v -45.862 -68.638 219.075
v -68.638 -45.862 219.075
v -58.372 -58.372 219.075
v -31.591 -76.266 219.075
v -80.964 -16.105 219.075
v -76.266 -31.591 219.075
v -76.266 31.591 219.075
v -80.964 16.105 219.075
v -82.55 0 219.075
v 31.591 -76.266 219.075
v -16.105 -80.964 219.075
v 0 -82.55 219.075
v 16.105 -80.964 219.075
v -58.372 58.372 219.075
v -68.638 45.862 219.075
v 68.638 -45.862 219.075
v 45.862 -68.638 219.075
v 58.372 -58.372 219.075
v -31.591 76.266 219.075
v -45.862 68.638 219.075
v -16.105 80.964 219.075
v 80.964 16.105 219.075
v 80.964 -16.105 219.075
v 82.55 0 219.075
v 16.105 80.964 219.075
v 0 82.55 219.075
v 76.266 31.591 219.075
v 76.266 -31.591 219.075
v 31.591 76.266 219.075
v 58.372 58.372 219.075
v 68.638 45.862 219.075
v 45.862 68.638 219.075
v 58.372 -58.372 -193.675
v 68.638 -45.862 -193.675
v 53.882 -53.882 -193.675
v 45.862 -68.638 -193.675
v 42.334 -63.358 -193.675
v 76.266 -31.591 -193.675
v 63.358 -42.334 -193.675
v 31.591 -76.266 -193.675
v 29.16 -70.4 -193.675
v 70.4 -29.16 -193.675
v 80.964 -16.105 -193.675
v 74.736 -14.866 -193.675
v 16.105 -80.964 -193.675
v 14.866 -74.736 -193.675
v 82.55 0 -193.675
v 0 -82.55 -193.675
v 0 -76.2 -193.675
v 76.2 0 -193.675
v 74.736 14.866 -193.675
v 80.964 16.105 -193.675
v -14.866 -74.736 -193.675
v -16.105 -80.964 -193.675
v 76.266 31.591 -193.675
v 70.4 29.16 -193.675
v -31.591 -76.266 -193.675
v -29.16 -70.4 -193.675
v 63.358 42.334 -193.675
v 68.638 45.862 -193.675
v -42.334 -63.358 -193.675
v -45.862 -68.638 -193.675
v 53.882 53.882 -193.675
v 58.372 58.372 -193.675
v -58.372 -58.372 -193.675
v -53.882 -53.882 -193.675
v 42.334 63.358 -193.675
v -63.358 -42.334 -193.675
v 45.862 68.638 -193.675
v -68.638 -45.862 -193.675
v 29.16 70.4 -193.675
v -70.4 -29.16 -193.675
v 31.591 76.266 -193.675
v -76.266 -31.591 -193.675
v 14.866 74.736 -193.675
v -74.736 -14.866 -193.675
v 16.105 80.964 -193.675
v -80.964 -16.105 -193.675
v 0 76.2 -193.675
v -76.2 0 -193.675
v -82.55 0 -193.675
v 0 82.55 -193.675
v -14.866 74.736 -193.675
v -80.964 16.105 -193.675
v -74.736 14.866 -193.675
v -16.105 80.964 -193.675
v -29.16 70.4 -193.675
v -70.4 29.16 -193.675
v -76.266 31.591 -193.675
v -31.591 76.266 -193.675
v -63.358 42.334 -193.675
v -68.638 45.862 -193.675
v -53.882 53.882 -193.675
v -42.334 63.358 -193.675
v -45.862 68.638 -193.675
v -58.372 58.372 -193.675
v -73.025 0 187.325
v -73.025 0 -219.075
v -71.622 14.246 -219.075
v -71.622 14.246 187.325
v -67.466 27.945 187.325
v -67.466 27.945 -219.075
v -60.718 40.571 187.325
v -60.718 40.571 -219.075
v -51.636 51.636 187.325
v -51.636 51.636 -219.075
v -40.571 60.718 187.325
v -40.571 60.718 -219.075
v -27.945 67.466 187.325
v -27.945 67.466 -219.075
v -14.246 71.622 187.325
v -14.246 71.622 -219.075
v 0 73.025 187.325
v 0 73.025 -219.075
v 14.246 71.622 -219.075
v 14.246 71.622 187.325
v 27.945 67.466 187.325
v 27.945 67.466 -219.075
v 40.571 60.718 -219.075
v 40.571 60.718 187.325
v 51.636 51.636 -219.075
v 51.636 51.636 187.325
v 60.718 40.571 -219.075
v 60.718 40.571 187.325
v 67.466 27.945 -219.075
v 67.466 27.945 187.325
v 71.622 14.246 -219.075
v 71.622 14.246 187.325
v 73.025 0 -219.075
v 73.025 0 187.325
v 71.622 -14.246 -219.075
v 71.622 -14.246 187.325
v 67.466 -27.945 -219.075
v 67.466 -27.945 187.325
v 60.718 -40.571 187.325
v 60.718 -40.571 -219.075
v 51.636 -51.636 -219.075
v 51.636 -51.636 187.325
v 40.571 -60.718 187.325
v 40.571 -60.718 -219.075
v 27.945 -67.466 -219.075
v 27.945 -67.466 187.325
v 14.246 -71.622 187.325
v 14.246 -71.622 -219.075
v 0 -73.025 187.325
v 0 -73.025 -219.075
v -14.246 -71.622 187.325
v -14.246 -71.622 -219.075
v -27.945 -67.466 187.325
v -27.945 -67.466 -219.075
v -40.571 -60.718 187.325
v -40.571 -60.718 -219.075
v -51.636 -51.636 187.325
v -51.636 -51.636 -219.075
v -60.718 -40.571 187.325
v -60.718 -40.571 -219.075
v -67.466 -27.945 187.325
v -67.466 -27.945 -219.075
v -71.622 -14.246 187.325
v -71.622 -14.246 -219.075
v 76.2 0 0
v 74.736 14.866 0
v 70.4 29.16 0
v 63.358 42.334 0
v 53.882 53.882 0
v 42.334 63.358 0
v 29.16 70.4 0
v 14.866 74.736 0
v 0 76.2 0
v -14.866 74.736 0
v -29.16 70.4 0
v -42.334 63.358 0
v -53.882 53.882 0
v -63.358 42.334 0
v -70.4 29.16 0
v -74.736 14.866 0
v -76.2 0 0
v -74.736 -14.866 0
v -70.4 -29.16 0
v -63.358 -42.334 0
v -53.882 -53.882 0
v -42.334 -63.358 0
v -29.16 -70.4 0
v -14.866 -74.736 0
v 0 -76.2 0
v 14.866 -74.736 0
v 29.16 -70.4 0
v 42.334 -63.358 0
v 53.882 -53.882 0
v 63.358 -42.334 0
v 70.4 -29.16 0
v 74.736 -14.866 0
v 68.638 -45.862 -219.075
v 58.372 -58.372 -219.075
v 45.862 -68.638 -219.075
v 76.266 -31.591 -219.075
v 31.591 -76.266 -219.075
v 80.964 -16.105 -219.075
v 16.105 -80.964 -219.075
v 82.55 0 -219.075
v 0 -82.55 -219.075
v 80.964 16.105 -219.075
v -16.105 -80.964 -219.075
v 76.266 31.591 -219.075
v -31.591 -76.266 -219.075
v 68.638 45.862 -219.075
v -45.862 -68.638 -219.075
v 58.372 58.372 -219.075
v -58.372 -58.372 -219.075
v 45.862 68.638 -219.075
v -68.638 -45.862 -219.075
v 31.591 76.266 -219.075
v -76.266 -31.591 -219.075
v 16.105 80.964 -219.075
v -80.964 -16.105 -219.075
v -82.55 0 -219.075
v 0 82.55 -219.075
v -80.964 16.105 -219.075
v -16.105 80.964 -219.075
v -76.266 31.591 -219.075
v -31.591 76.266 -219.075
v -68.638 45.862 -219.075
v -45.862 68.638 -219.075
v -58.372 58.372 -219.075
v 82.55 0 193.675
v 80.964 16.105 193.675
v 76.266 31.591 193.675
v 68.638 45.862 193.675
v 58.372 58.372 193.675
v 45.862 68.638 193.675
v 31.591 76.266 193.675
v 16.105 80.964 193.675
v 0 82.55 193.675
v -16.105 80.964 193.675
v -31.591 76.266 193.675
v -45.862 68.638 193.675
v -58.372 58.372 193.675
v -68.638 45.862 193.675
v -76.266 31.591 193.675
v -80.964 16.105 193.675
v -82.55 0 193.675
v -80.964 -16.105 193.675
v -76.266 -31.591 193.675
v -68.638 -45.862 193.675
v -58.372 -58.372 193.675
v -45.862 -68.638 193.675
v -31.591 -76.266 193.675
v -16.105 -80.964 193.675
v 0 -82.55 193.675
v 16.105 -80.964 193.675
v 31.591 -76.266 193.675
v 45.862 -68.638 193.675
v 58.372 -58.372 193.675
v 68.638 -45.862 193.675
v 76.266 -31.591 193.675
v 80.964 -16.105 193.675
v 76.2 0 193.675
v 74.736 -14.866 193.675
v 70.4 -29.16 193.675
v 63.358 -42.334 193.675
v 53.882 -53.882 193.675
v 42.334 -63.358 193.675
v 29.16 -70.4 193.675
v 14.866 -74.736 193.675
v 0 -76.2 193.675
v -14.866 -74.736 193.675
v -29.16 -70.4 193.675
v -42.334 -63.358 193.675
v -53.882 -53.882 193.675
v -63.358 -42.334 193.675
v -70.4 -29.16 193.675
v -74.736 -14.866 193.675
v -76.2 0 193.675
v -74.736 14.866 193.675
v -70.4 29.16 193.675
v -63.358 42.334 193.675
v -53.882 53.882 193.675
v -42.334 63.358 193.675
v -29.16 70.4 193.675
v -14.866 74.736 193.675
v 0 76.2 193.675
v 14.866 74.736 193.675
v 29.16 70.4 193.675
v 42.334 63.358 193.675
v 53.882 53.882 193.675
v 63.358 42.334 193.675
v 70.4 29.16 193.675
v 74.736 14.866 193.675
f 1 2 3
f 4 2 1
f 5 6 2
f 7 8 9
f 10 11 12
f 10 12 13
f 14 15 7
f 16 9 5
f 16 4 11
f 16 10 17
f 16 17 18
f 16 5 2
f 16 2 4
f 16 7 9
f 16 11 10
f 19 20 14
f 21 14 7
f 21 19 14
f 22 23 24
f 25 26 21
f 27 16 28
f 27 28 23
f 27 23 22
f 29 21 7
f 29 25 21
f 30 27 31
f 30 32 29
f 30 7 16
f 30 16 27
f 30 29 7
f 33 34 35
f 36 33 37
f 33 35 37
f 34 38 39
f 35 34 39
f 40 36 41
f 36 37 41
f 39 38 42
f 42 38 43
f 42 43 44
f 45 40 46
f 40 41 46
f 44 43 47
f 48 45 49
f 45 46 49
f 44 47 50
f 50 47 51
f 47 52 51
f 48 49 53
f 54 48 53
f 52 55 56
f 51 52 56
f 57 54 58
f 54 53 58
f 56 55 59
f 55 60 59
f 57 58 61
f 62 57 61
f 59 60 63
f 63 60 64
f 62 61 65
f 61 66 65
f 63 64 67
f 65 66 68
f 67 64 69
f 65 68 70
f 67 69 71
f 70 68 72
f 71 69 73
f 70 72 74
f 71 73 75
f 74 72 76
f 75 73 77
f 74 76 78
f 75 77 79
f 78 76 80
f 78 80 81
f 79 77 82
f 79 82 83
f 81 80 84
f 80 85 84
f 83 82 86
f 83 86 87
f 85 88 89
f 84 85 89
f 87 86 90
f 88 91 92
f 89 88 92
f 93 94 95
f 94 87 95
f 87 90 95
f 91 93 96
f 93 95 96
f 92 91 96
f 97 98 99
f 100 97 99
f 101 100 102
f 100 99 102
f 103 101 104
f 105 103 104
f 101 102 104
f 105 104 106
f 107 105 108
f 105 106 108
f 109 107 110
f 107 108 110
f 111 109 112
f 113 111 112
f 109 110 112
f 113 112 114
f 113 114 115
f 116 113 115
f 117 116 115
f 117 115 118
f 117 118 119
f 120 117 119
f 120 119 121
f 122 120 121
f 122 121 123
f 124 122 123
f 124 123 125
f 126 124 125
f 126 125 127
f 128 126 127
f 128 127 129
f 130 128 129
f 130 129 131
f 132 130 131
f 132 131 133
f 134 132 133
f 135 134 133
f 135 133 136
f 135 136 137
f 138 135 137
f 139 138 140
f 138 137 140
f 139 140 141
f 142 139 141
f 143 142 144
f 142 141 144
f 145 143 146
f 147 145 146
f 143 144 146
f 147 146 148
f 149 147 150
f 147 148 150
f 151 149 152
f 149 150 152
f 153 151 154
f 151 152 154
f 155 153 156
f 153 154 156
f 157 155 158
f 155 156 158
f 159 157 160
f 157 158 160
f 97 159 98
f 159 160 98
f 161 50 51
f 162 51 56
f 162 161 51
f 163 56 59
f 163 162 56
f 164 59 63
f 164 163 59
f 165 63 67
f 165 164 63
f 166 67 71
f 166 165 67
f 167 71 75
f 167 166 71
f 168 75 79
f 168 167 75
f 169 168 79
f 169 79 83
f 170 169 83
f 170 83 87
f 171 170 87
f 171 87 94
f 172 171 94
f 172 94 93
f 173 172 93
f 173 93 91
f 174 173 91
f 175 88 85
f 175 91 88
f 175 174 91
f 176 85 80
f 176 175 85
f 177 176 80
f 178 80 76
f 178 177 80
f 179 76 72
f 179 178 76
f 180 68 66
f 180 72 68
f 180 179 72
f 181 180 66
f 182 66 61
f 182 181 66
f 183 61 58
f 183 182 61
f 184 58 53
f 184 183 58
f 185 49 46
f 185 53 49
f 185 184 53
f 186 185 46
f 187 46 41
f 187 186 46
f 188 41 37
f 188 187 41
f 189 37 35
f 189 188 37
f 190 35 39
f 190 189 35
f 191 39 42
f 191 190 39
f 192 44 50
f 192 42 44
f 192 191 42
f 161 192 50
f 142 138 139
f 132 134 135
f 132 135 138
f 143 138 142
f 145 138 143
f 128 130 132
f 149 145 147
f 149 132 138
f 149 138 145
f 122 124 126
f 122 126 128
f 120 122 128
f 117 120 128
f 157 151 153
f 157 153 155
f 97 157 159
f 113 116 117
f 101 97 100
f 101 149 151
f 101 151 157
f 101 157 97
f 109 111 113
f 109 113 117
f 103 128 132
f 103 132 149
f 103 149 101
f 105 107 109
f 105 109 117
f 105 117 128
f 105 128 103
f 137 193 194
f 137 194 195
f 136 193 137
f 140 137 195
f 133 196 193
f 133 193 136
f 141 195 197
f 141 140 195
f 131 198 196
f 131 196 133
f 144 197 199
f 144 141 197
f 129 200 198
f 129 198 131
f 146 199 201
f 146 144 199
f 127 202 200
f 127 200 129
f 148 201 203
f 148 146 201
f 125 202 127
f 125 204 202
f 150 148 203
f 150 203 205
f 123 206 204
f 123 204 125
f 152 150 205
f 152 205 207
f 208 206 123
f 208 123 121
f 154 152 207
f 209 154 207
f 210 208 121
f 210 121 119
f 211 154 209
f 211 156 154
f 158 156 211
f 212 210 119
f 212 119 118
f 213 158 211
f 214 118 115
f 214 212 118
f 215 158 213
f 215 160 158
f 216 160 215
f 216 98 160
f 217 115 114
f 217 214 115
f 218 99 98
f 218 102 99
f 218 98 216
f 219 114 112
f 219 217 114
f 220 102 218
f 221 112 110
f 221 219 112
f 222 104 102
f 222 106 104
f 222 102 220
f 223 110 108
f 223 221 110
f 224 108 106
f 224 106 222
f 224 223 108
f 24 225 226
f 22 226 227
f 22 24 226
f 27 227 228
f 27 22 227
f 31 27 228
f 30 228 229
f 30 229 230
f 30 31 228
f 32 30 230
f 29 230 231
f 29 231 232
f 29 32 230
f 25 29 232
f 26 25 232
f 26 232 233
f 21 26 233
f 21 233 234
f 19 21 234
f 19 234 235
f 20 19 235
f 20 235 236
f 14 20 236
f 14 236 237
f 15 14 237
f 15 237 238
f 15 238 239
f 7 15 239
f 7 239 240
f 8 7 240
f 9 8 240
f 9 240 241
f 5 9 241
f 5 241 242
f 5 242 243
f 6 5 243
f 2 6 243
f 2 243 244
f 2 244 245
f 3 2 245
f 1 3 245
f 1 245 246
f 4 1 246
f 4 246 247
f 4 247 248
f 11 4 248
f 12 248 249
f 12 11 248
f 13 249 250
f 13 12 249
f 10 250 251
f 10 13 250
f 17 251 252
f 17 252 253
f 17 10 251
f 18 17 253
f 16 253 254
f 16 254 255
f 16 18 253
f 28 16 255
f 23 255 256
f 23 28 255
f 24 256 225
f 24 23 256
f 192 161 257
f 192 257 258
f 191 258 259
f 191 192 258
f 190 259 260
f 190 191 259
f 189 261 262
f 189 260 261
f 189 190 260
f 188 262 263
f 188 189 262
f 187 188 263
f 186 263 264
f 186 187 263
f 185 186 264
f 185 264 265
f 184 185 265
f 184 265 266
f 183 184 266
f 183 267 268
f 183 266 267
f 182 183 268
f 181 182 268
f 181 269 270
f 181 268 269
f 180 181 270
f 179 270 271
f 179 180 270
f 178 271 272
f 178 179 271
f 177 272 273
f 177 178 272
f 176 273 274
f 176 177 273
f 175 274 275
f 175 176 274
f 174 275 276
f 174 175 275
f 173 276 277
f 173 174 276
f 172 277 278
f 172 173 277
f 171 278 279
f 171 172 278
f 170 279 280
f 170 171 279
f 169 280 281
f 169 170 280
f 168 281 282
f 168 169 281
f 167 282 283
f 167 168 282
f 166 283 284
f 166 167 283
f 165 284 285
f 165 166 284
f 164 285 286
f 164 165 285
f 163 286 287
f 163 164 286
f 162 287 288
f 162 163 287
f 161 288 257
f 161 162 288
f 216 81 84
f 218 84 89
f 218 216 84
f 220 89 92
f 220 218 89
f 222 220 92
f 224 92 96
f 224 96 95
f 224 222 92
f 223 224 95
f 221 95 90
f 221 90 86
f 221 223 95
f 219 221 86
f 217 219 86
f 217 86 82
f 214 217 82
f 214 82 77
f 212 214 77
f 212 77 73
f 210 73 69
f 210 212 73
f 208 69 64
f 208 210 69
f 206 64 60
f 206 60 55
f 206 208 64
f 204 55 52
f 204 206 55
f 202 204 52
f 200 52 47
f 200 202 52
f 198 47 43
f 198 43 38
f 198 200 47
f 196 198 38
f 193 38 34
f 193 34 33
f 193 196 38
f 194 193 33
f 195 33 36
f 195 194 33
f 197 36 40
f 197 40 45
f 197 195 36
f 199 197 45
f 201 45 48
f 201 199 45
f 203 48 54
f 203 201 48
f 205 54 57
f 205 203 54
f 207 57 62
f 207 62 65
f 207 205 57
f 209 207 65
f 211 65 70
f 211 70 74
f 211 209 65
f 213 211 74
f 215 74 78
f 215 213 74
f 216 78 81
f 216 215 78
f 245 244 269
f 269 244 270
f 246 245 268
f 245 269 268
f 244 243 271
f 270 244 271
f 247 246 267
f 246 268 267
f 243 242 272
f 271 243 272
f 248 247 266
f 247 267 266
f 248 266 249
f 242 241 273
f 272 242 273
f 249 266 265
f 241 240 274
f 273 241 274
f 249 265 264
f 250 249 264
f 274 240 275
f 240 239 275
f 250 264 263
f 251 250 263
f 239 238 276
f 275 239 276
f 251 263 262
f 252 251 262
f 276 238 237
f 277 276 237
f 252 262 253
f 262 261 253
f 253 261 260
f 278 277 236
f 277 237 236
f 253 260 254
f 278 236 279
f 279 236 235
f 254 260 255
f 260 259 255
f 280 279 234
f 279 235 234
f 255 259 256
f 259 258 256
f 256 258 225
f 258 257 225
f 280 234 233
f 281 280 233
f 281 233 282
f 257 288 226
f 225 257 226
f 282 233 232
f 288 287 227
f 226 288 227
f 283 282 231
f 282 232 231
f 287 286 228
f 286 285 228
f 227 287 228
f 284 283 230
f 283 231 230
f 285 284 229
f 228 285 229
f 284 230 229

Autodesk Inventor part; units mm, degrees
ref_plane "YZ Plane" through (0, 0, 0) normal (1, 0, 0) x (0, 1, 0)
ref_plane "XZ Plane" through (0, 0, 0) normal (0, 1, 0) x (-1, 0, 0)
ref_plane "XY Plane" through (0, 0, 0) normal (0, 0, 1) x (1, 0, 0)
sketch "Sketch1" plane through (0, 0, 0) normal (0, 0, 1) x (1, 0, 0)
  circle A0 centre (0, 0) radius 76.2
  dimension "tubeDiameter" = 152.4
extrude "Extrusion1" add sketch "Sketch1" along normal mid plane 438.15
sketch "Sketch2" plane through (0, 0, -219.075) normal (0, 0, -1) x (-1, 0, 0)
  circle A0 centre (0, 0) radius 73.025
  dimension "d6" = 146.05
extrude "Extrusion2" cut sketch "Sketch2" against normal blind 406.4
sketch "Sketch3" plane through (0, 0, 219.075) normal (0, 0, 1) x (1, 0, 0)
  circle A0 centre (0, 0) radius 82.55
  circle A1 centre (0, 0) radius 76.2
  dimension "d9" = 165.1
extrude "Extrusion3" add sketch "Sketch3" against normal blind 25.4
sketch "Sketch4" plane through (0, 0, -219.075) normal (0, 0, -1) x (-1, 0, 0)
  circle A0 centre (0, 0) radius 76.2
  circle A1 centre (0, 0) radius 82.55
extrude "Extrusion4" add sketch "Sketch4" against normal blind 25.4
properties part number "telescopeTube" material "Aluminum 6061"
